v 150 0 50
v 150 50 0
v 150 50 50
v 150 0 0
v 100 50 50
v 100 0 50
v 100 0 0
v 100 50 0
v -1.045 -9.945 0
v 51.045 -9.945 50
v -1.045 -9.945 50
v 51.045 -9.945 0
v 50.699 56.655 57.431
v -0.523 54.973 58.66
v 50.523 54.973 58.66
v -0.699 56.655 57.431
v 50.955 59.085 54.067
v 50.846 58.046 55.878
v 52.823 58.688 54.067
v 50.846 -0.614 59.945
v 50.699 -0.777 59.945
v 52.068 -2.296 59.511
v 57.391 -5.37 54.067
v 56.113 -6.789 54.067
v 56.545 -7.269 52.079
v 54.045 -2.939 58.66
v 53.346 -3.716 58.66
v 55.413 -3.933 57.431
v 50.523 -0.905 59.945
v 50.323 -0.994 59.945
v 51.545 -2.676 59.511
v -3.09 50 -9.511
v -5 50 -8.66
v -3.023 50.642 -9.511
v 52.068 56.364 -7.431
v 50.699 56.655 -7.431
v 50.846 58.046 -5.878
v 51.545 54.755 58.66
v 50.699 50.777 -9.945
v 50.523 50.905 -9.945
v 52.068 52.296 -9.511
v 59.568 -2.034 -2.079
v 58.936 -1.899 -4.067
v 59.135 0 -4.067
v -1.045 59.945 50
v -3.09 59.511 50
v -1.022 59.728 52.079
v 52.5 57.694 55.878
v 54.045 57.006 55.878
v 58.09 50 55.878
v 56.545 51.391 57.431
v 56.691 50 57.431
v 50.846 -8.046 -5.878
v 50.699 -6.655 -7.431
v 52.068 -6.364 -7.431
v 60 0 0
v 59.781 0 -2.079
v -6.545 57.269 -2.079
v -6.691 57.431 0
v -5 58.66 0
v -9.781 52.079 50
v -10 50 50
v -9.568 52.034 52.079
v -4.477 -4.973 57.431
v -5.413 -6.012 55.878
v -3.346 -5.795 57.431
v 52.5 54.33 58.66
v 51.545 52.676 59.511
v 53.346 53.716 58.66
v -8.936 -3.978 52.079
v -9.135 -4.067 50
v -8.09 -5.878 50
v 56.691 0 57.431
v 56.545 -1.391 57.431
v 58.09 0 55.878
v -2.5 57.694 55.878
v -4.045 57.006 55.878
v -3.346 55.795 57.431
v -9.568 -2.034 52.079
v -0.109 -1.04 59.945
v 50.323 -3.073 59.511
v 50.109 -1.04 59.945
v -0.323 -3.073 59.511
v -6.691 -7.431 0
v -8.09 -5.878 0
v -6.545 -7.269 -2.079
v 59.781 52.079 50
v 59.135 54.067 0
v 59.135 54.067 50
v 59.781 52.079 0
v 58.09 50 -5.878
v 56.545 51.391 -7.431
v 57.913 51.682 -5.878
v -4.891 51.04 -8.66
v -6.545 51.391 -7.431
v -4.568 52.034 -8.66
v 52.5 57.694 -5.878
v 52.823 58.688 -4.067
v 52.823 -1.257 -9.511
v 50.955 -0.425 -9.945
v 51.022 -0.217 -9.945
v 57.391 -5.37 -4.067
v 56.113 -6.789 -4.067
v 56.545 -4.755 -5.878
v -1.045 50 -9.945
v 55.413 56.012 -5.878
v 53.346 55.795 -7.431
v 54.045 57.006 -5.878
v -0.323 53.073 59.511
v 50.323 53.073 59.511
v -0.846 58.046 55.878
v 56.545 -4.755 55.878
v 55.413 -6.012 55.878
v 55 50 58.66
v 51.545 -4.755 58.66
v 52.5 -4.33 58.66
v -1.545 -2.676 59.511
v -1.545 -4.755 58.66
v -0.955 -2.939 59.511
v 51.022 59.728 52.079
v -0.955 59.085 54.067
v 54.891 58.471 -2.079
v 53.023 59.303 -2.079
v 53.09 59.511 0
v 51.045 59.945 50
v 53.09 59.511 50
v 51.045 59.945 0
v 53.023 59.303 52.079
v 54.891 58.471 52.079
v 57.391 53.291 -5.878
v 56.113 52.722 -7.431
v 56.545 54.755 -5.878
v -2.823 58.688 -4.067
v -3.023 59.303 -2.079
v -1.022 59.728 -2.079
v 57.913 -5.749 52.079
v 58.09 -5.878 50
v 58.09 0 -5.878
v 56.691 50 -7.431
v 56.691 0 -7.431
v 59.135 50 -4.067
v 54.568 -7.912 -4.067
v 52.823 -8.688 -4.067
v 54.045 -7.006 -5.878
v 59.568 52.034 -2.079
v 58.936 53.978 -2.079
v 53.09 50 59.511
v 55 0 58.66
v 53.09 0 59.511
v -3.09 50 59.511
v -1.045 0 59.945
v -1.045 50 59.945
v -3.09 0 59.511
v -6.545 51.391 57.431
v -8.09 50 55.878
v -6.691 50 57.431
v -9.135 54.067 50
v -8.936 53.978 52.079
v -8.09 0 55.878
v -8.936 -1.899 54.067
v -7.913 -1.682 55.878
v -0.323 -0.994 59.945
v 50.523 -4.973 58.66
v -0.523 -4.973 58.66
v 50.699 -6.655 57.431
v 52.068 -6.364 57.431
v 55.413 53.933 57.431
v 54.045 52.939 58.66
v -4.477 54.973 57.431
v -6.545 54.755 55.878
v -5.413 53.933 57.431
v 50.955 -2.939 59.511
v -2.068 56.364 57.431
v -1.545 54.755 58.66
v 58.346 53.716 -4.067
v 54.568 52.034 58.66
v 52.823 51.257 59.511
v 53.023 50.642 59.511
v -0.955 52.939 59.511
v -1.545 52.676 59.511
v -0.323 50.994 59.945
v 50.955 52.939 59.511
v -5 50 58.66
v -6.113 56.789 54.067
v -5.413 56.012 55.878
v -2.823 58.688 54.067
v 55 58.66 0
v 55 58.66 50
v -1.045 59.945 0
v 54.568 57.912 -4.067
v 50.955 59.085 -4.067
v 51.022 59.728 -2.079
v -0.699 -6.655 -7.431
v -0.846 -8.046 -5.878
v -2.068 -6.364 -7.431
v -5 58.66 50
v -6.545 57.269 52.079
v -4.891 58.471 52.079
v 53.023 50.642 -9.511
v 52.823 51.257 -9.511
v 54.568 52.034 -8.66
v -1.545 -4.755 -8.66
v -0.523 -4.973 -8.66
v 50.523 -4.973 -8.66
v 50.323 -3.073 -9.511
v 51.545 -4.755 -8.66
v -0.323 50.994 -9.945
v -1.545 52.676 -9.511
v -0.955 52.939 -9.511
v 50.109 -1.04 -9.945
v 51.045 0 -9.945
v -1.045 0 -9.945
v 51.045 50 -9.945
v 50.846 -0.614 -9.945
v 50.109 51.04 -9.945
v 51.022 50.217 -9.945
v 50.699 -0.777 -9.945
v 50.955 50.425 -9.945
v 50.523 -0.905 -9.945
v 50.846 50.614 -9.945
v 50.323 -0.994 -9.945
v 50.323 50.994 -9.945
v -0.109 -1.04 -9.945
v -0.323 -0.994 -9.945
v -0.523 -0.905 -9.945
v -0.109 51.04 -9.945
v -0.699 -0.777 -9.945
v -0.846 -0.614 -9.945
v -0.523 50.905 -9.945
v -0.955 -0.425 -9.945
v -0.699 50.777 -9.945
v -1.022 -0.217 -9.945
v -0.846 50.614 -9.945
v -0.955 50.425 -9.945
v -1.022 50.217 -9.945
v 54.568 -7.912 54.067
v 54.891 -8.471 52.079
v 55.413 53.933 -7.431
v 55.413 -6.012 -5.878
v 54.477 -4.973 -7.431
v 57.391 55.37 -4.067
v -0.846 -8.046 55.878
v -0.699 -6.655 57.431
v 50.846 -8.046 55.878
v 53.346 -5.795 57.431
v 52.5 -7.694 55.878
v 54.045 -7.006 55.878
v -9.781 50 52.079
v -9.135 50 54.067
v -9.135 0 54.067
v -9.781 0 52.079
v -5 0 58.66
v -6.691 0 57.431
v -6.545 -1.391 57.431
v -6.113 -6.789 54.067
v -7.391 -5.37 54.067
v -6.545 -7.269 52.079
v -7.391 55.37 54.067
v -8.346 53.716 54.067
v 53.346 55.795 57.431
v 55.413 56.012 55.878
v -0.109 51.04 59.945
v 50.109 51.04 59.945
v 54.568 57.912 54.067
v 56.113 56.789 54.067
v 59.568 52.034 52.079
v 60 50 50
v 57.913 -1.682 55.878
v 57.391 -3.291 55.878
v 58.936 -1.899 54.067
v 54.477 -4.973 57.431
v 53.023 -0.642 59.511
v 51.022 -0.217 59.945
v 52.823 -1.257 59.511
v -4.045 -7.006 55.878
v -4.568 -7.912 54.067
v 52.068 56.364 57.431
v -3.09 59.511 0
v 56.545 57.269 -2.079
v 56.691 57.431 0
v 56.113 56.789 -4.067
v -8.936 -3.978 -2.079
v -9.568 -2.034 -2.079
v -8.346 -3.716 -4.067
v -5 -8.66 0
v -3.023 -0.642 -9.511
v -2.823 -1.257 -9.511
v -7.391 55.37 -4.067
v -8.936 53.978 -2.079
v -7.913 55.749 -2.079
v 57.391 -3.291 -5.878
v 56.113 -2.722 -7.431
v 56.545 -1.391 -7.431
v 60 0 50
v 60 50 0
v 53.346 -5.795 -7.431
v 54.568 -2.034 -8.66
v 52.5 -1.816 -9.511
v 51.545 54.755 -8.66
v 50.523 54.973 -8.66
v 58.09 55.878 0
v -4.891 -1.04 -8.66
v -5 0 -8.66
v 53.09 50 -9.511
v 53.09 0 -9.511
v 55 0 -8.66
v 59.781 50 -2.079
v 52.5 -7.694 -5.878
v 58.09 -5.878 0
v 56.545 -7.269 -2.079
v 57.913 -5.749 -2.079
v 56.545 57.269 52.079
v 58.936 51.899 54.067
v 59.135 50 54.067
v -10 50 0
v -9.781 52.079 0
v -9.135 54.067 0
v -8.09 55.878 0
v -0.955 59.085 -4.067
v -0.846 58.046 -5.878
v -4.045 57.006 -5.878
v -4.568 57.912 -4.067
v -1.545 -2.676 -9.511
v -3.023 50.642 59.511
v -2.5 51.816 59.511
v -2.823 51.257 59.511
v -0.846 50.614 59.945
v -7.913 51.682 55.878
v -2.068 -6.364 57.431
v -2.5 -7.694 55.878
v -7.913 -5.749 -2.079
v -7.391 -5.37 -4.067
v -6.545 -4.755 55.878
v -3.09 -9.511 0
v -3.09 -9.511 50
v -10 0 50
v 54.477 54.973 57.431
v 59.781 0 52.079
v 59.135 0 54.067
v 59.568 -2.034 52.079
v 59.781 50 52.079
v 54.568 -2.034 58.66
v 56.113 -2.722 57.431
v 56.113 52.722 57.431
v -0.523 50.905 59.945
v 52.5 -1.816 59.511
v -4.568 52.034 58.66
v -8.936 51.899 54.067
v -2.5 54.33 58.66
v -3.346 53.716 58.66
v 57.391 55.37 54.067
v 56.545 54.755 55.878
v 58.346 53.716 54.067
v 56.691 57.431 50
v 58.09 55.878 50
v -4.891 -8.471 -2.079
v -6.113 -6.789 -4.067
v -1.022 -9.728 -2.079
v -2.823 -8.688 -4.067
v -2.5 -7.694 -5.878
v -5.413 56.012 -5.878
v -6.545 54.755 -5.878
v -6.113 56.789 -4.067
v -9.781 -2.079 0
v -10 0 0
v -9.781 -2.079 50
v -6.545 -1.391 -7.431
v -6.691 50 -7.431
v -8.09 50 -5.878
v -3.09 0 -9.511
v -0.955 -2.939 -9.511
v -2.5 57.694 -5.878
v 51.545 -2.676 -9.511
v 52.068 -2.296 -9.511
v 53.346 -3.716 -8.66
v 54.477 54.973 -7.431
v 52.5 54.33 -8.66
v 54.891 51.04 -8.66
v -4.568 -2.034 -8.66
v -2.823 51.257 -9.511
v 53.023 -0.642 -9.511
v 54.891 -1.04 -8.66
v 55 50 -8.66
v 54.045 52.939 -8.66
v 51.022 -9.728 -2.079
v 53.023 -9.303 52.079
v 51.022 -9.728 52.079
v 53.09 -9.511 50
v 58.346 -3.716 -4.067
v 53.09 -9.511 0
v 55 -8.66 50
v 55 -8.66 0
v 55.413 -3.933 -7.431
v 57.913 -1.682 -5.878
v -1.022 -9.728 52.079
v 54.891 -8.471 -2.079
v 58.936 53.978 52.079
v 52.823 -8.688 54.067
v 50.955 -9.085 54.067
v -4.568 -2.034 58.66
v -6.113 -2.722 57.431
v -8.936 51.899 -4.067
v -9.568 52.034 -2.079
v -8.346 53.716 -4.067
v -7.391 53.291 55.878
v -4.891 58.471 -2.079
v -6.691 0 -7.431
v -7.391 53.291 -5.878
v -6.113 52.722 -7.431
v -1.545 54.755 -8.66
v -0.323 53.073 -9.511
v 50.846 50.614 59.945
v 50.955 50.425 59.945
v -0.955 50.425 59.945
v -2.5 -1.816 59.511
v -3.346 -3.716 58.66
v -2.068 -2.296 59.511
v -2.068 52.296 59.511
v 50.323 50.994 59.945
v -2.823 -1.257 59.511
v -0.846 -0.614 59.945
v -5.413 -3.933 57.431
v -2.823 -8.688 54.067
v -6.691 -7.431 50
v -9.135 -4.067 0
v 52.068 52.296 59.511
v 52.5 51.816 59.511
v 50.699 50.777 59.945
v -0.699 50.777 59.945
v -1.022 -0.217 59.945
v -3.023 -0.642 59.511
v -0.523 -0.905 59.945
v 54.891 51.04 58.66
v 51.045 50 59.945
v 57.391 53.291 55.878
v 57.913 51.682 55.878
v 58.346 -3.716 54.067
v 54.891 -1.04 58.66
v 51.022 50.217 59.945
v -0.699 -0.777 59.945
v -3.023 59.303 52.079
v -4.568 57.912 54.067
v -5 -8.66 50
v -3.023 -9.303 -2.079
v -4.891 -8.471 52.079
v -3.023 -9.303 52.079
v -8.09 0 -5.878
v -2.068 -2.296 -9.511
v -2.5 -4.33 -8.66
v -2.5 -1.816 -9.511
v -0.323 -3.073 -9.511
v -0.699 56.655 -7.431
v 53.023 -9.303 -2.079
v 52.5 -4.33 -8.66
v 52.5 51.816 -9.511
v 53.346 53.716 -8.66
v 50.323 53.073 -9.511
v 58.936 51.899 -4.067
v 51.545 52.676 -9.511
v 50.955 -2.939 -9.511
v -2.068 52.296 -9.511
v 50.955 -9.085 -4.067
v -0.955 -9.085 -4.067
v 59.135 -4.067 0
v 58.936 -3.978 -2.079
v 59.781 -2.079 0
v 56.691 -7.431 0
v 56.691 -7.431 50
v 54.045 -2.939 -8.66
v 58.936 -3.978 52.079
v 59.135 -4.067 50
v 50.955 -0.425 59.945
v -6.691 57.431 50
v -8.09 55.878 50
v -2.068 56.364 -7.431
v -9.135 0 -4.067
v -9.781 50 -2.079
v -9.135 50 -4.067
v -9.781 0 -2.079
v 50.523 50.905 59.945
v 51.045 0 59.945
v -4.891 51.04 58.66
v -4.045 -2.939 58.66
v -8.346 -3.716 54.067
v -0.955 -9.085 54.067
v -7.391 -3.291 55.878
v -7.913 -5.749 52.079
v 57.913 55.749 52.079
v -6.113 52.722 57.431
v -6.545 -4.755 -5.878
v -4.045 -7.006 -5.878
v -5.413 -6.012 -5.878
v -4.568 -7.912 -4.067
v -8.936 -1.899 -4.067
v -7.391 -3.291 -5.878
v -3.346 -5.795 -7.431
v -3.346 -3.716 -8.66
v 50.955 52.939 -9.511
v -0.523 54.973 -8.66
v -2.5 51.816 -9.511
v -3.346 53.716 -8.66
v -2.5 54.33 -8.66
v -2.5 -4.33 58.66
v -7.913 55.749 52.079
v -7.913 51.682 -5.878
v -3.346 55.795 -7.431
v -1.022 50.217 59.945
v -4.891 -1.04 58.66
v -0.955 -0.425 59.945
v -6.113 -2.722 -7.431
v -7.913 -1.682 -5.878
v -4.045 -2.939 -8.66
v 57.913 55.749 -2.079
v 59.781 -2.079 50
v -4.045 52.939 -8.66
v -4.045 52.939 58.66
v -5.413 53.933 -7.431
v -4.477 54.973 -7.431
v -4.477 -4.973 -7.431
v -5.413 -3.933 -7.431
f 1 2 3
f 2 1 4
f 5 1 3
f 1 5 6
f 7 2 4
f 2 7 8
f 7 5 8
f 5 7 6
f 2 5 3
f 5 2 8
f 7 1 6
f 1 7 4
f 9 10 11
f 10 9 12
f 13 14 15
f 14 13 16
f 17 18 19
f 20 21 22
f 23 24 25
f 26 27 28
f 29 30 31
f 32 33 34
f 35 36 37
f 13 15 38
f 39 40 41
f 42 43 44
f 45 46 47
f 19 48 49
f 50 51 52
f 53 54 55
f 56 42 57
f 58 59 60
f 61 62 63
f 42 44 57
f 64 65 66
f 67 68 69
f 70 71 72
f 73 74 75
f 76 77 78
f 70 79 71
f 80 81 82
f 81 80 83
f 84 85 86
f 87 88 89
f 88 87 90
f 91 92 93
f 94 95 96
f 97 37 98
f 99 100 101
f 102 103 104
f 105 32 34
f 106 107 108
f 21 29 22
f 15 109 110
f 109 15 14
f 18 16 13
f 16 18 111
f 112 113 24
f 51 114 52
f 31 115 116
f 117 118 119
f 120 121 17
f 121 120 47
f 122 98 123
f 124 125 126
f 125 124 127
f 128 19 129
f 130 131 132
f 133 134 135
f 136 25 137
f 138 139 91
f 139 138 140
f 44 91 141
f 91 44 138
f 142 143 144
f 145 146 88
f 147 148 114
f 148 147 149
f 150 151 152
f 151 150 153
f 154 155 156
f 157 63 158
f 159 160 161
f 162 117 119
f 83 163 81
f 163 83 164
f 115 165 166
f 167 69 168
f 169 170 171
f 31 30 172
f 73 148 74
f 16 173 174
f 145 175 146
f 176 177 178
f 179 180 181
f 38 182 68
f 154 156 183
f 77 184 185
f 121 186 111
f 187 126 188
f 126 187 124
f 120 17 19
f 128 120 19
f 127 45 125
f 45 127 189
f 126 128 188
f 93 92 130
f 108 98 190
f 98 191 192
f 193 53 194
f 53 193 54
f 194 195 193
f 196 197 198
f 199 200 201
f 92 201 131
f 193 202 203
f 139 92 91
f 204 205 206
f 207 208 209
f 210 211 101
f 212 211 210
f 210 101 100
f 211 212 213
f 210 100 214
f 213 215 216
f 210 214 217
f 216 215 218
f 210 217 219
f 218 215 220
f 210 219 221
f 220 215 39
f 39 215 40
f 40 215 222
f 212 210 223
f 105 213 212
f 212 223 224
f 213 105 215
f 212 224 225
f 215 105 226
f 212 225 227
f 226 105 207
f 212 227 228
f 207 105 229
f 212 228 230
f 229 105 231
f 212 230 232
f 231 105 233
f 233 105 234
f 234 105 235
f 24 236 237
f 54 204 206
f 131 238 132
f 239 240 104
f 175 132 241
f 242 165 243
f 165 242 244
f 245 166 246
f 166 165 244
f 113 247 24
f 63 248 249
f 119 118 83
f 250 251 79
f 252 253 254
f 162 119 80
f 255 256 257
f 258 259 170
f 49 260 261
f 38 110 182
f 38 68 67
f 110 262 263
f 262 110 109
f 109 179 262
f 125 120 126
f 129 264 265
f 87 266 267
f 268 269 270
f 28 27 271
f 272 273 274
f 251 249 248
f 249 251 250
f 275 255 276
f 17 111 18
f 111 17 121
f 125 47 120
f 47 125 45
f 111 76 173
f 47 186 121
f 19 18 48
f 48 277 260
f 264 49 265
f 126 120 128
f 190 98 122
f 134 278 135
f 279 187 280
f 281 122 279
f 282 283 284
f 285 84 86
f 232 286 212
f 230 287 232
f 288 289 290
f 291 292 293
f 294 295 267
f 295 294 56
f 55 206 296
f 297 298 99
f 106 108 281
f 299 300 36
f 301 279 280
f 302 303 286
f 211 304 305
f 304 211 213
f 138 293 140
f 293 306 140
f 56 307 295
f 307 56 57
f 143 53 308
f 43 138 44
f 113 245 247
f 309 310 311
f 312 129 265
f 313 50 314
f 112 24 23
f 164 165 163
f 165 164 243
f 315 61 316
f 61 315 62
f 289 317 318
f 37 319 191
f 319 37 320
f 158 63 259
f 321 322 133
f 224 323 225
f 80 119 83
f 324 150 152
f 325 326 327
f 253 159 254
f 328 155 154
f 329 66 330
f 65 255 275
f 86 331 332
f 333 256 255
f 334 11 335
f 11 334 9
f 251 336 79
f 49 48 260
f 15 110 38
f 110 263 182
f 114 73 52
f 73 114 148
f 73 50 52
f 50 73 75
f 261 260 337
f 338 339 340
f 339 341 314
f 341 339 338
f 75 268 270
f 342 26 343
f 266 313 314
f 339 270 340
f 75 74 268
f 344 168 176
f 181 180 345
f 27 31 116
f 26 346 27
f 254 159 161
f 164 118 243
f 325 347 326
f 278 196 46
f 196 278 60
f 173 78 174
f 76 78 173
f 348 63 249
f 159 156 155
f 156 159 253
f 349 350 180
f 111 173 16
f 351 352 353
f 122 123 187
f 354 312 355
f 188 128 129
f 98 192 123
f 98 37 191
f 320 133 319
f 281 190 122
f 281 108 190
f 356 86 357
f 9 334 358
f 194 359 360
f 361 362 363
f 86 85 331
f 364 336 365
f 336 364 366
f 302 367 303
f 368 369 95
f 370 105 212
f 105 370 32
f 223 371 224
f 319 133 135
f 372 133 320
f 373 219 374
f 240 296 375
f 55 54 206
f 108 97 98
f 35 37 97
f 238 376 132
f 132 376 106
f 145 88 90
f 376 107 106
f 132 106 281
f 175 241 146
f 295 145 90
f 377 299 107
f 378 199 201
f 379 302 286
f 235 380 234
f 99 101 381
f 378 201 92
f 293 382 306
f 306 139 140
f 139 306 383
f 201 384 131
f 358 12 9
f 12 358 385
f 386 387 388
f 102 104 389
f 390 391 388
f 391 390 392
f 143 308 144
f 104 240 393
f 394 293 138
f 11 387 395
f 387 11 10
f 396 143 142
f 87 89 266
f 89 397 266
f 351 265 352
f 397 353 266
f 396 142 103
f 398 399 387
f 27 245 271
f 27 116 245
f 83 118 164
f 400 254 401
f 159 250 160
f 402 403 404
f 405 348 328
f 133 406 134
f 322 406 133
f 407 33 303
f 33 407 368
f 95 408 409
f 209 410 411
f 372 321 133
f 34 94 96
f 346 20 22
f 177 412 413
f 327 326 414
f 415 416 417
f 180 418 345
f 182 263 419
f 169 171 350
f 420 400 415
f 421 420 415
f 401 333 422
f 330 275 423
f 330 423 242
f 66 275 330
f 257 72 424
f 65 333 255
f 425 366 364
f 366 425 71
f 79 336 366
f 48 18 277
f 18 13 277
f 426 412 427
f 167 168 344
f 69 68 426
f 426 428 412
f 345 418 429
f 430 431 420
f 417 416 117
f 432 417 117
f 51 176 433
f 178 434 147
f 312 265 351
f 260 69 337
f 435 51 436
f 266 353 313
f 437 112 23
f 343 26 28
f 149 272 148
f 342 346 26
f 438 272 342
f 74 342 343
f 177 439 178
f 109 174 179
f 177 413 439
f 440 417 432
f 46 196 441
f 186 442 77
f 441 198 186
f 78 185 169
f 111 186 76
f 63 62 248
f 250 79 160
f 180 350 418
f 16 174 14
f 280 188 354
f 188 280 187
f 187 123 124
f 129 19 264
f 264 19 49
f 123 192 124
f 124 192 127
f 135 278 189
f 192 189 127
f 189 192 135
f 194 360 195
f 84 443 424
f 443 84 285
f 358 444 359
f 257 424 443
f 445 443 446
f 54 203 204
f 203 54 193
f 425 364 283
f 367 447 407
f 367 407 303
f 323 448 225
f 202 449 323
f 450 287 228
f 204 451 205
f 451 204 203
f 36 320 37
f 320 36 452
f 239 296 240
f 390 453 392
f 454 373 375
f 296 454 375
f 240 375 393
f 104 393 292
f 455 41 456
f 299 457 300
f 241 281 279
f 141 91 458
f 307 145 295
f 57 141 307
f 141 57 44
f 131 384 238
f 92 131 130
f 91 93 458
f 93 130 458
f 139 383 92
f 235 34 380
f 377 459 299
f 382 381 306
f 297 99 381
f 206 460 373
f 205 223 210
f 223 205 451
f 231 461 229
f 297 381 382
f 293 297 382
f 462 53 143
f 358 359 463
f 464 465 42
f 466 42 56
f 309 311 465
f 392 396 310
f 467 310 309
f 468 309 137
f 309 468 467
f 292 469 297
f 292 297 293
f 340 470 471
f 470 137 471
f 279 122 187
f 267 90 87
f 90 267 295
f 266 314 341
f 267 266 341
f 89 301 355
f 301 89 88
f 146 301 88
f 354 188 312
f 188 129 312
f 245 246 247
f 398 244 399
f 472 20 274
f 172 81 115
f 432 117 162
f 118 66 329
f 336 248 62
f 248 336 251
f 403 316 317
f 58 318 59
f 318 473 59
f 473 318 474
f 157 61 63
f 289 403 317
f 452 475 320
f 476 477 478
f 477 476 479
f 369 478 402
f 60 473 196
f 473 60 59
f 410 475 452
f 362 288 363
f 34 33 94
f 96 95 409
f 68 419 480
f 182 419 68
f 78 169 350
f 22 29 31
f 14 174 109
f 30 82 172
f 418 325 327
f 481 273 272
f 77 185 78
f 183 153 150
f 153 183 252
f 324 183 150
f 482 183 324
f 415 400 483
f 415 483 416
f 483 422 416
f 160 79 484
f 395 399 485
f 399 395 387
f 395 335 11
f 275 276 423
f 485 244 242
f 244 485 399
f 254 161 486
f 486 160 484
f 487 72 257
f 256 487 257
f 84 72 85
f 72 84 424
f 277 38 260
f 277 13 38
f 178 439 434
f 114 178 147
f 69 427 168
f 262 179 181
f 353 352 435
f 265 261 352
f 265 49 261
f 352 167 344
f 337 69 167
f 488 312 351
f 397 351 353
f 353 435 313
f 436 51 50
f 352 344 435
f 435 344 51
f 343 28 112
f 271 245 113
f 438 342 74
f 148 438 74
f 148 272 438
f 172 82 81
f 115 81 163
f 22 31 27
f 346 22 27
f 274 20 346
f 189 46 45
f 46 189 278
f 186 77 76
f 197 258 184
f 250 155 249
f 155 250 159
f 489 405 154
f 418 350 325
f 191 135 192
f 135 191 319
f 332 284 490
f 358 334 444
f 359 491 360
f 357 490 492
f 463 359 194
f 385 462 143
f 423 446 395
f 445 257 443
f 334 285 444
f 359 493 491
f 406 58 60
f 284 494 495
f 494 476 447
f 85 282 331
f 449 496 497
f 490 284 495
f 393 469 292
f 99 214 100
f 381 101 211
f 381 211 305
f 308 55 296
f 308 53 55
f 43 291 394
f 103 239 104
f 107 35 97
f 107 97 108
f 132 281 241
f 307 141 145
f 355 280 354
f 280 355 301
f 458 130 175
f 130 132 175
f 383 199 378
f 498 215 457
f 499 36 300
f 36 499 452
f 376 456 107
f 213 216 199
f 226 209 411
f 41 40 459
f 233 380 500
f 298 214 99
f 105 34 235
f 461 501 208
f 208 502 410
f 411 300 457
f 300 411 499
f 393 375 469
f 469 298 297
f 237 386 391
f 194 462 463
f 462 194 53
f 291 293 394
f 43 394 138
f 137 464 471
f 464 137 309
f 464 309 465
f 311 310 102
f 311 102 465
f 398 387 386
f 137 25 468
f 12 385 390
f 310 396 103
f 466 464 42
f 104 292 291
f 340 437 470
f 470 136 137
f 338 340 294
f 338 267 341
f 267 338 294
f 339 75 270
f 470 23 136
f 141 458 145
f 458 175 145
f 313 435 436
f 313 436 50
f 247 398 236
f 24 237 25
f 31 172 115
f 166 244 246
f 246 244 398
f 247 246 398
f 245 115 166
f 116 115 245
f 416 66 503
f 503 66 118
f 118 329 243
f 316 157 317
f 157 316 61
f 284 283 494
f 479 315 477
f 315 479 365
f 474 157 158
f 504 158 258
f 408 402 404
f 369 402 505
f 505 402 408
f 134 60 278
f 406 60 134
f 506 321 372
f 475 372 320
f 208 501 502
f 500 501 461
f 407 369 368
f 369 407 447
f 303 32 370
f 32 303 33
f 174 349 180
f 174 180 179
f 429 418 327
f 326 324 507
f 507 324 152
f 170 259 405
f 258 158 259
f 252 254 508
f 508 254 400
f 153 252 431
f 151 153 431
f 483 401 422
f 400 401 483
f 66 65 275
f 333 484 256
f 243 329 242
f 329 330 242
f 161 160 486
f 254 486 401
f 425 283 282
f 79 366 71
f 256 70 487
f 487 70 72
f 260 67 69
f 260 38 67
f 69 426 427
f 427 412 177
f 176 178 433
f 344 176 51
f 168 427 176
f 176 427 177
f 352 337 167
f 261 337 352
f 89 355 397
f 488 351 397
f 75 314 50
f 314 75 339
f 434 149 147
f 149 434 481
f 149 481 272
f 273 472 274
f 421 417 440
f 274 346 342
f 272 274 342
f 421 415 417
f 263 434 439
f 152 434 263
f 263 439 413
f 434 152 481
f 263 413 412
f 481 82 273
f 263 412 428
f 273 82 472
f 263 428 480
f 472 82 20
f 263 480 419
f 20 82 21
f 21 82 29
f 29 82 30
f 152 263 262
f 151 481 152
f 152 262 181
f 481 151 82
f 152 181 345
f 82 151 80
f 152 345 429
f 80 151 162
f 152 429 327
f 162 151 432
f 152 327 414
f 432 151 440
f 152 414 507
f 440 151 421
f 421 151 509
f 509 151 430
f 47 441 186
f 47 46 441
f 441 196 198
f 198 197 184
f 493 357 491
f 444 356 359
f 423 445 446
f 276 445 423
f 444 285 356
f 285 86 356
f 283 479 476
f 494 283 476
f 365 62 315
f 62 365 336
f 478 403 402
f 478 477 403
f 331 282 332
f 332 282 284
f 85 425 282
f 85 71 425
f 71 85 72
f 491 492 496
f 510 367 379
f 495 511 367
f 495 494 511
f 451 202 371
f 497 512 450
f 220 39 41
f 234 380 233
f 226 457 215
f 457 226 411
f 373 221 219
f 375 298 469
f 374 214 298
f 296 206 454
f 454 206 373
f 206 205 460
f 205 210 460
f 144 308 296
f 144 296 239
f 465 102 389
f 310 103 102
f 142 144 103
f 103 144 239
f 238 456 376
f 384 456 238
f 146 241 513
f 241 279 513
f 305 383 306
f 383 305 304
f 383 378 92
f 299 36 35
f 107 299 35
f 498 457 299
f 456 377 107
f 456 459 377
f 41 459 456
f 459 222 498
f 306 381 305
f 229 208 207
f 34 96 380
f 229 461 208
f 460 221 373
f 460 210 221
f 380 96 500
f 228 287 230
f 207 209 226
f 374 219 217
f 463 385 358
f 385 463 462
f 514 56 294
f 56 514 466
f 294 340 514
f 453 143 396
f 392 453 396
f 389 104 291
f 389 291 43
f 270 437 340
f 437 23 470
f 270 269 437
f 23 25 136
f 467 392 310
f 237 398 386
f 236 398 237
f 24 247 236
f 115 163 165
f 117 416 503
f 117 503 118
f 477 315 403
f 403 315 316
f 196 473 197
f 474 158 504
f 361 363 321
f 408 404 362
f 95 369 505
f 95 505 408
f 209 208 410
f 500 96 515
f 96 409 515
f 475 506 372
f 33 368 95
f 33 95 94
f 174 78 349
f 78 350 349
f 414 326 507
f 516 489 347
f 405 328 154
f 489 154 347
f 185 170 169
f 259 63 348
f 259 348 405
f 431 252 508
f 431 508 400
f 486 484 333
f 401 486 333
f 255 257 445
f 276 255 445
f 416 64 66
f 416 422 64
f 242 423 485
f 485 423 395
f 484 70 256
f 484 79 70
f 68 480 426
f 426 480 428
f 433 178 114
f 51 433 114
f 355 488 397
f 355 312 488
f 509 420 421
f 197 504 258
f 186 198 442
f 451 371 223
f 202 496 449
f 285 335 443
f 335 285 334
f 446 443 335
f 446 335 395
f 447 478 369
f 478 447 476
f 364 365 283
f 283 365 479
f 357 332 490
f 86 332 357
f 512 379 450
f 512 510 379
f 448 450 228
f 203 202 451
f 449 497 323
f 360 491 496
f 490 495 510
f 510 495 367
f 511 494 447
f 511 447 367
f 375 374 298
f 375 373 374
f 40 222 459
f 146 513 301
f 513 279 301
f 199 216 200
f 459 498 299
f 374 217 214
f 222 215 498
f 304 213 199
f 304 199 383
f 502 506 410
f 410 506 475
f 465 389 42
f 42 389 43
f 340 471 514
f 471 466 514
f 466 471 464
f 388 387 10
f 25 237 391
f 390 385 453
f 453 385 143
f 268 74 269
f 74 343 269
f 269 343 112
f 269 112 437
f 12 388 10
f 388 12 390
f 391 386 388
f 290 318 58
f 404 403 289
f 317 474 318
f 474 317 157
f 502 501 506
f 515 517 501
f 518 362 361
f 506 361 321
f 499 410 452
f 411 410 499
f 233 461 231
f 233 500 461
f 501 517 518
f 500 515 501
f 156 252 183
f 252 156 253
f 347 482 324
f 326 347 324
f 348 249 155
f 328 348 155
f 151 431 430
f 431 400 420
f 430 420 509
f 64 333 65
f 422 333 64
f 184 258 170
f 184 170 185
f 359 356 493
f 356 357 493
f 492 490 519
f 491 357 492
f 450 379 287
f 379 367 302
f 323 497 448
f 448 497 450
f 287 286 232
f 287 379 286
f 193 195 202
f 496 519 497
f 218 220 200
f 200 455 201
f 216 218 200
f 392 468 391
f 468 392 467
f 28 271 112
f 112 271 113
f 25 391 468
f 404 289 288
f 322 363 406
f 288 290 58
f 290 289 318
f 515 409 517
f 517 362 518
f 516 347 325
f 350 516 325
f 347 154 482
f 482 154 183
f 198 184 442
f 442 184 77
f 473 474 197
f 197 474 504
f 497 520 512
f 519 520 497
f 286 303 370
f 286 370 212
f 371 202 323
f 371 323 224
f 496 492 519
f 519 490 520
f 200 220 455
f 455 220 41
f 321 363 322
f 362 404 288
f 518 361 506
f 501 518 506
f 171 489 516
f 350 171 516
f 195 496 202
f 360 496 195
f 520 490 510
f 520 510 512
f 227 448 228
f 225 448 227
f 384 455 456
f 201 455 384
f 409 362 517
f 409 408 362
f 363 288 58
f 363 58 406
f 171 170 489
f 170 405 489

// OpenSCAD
cube_size = 50;
fattening = 10;

module fatten(r){
    minkowski(){
        sphere(r=r);
        children();
    }
}


translate([cube_size*2,0,0]) cube(cube_size);

fatten(fattening){
    cube(cube_size);
};
